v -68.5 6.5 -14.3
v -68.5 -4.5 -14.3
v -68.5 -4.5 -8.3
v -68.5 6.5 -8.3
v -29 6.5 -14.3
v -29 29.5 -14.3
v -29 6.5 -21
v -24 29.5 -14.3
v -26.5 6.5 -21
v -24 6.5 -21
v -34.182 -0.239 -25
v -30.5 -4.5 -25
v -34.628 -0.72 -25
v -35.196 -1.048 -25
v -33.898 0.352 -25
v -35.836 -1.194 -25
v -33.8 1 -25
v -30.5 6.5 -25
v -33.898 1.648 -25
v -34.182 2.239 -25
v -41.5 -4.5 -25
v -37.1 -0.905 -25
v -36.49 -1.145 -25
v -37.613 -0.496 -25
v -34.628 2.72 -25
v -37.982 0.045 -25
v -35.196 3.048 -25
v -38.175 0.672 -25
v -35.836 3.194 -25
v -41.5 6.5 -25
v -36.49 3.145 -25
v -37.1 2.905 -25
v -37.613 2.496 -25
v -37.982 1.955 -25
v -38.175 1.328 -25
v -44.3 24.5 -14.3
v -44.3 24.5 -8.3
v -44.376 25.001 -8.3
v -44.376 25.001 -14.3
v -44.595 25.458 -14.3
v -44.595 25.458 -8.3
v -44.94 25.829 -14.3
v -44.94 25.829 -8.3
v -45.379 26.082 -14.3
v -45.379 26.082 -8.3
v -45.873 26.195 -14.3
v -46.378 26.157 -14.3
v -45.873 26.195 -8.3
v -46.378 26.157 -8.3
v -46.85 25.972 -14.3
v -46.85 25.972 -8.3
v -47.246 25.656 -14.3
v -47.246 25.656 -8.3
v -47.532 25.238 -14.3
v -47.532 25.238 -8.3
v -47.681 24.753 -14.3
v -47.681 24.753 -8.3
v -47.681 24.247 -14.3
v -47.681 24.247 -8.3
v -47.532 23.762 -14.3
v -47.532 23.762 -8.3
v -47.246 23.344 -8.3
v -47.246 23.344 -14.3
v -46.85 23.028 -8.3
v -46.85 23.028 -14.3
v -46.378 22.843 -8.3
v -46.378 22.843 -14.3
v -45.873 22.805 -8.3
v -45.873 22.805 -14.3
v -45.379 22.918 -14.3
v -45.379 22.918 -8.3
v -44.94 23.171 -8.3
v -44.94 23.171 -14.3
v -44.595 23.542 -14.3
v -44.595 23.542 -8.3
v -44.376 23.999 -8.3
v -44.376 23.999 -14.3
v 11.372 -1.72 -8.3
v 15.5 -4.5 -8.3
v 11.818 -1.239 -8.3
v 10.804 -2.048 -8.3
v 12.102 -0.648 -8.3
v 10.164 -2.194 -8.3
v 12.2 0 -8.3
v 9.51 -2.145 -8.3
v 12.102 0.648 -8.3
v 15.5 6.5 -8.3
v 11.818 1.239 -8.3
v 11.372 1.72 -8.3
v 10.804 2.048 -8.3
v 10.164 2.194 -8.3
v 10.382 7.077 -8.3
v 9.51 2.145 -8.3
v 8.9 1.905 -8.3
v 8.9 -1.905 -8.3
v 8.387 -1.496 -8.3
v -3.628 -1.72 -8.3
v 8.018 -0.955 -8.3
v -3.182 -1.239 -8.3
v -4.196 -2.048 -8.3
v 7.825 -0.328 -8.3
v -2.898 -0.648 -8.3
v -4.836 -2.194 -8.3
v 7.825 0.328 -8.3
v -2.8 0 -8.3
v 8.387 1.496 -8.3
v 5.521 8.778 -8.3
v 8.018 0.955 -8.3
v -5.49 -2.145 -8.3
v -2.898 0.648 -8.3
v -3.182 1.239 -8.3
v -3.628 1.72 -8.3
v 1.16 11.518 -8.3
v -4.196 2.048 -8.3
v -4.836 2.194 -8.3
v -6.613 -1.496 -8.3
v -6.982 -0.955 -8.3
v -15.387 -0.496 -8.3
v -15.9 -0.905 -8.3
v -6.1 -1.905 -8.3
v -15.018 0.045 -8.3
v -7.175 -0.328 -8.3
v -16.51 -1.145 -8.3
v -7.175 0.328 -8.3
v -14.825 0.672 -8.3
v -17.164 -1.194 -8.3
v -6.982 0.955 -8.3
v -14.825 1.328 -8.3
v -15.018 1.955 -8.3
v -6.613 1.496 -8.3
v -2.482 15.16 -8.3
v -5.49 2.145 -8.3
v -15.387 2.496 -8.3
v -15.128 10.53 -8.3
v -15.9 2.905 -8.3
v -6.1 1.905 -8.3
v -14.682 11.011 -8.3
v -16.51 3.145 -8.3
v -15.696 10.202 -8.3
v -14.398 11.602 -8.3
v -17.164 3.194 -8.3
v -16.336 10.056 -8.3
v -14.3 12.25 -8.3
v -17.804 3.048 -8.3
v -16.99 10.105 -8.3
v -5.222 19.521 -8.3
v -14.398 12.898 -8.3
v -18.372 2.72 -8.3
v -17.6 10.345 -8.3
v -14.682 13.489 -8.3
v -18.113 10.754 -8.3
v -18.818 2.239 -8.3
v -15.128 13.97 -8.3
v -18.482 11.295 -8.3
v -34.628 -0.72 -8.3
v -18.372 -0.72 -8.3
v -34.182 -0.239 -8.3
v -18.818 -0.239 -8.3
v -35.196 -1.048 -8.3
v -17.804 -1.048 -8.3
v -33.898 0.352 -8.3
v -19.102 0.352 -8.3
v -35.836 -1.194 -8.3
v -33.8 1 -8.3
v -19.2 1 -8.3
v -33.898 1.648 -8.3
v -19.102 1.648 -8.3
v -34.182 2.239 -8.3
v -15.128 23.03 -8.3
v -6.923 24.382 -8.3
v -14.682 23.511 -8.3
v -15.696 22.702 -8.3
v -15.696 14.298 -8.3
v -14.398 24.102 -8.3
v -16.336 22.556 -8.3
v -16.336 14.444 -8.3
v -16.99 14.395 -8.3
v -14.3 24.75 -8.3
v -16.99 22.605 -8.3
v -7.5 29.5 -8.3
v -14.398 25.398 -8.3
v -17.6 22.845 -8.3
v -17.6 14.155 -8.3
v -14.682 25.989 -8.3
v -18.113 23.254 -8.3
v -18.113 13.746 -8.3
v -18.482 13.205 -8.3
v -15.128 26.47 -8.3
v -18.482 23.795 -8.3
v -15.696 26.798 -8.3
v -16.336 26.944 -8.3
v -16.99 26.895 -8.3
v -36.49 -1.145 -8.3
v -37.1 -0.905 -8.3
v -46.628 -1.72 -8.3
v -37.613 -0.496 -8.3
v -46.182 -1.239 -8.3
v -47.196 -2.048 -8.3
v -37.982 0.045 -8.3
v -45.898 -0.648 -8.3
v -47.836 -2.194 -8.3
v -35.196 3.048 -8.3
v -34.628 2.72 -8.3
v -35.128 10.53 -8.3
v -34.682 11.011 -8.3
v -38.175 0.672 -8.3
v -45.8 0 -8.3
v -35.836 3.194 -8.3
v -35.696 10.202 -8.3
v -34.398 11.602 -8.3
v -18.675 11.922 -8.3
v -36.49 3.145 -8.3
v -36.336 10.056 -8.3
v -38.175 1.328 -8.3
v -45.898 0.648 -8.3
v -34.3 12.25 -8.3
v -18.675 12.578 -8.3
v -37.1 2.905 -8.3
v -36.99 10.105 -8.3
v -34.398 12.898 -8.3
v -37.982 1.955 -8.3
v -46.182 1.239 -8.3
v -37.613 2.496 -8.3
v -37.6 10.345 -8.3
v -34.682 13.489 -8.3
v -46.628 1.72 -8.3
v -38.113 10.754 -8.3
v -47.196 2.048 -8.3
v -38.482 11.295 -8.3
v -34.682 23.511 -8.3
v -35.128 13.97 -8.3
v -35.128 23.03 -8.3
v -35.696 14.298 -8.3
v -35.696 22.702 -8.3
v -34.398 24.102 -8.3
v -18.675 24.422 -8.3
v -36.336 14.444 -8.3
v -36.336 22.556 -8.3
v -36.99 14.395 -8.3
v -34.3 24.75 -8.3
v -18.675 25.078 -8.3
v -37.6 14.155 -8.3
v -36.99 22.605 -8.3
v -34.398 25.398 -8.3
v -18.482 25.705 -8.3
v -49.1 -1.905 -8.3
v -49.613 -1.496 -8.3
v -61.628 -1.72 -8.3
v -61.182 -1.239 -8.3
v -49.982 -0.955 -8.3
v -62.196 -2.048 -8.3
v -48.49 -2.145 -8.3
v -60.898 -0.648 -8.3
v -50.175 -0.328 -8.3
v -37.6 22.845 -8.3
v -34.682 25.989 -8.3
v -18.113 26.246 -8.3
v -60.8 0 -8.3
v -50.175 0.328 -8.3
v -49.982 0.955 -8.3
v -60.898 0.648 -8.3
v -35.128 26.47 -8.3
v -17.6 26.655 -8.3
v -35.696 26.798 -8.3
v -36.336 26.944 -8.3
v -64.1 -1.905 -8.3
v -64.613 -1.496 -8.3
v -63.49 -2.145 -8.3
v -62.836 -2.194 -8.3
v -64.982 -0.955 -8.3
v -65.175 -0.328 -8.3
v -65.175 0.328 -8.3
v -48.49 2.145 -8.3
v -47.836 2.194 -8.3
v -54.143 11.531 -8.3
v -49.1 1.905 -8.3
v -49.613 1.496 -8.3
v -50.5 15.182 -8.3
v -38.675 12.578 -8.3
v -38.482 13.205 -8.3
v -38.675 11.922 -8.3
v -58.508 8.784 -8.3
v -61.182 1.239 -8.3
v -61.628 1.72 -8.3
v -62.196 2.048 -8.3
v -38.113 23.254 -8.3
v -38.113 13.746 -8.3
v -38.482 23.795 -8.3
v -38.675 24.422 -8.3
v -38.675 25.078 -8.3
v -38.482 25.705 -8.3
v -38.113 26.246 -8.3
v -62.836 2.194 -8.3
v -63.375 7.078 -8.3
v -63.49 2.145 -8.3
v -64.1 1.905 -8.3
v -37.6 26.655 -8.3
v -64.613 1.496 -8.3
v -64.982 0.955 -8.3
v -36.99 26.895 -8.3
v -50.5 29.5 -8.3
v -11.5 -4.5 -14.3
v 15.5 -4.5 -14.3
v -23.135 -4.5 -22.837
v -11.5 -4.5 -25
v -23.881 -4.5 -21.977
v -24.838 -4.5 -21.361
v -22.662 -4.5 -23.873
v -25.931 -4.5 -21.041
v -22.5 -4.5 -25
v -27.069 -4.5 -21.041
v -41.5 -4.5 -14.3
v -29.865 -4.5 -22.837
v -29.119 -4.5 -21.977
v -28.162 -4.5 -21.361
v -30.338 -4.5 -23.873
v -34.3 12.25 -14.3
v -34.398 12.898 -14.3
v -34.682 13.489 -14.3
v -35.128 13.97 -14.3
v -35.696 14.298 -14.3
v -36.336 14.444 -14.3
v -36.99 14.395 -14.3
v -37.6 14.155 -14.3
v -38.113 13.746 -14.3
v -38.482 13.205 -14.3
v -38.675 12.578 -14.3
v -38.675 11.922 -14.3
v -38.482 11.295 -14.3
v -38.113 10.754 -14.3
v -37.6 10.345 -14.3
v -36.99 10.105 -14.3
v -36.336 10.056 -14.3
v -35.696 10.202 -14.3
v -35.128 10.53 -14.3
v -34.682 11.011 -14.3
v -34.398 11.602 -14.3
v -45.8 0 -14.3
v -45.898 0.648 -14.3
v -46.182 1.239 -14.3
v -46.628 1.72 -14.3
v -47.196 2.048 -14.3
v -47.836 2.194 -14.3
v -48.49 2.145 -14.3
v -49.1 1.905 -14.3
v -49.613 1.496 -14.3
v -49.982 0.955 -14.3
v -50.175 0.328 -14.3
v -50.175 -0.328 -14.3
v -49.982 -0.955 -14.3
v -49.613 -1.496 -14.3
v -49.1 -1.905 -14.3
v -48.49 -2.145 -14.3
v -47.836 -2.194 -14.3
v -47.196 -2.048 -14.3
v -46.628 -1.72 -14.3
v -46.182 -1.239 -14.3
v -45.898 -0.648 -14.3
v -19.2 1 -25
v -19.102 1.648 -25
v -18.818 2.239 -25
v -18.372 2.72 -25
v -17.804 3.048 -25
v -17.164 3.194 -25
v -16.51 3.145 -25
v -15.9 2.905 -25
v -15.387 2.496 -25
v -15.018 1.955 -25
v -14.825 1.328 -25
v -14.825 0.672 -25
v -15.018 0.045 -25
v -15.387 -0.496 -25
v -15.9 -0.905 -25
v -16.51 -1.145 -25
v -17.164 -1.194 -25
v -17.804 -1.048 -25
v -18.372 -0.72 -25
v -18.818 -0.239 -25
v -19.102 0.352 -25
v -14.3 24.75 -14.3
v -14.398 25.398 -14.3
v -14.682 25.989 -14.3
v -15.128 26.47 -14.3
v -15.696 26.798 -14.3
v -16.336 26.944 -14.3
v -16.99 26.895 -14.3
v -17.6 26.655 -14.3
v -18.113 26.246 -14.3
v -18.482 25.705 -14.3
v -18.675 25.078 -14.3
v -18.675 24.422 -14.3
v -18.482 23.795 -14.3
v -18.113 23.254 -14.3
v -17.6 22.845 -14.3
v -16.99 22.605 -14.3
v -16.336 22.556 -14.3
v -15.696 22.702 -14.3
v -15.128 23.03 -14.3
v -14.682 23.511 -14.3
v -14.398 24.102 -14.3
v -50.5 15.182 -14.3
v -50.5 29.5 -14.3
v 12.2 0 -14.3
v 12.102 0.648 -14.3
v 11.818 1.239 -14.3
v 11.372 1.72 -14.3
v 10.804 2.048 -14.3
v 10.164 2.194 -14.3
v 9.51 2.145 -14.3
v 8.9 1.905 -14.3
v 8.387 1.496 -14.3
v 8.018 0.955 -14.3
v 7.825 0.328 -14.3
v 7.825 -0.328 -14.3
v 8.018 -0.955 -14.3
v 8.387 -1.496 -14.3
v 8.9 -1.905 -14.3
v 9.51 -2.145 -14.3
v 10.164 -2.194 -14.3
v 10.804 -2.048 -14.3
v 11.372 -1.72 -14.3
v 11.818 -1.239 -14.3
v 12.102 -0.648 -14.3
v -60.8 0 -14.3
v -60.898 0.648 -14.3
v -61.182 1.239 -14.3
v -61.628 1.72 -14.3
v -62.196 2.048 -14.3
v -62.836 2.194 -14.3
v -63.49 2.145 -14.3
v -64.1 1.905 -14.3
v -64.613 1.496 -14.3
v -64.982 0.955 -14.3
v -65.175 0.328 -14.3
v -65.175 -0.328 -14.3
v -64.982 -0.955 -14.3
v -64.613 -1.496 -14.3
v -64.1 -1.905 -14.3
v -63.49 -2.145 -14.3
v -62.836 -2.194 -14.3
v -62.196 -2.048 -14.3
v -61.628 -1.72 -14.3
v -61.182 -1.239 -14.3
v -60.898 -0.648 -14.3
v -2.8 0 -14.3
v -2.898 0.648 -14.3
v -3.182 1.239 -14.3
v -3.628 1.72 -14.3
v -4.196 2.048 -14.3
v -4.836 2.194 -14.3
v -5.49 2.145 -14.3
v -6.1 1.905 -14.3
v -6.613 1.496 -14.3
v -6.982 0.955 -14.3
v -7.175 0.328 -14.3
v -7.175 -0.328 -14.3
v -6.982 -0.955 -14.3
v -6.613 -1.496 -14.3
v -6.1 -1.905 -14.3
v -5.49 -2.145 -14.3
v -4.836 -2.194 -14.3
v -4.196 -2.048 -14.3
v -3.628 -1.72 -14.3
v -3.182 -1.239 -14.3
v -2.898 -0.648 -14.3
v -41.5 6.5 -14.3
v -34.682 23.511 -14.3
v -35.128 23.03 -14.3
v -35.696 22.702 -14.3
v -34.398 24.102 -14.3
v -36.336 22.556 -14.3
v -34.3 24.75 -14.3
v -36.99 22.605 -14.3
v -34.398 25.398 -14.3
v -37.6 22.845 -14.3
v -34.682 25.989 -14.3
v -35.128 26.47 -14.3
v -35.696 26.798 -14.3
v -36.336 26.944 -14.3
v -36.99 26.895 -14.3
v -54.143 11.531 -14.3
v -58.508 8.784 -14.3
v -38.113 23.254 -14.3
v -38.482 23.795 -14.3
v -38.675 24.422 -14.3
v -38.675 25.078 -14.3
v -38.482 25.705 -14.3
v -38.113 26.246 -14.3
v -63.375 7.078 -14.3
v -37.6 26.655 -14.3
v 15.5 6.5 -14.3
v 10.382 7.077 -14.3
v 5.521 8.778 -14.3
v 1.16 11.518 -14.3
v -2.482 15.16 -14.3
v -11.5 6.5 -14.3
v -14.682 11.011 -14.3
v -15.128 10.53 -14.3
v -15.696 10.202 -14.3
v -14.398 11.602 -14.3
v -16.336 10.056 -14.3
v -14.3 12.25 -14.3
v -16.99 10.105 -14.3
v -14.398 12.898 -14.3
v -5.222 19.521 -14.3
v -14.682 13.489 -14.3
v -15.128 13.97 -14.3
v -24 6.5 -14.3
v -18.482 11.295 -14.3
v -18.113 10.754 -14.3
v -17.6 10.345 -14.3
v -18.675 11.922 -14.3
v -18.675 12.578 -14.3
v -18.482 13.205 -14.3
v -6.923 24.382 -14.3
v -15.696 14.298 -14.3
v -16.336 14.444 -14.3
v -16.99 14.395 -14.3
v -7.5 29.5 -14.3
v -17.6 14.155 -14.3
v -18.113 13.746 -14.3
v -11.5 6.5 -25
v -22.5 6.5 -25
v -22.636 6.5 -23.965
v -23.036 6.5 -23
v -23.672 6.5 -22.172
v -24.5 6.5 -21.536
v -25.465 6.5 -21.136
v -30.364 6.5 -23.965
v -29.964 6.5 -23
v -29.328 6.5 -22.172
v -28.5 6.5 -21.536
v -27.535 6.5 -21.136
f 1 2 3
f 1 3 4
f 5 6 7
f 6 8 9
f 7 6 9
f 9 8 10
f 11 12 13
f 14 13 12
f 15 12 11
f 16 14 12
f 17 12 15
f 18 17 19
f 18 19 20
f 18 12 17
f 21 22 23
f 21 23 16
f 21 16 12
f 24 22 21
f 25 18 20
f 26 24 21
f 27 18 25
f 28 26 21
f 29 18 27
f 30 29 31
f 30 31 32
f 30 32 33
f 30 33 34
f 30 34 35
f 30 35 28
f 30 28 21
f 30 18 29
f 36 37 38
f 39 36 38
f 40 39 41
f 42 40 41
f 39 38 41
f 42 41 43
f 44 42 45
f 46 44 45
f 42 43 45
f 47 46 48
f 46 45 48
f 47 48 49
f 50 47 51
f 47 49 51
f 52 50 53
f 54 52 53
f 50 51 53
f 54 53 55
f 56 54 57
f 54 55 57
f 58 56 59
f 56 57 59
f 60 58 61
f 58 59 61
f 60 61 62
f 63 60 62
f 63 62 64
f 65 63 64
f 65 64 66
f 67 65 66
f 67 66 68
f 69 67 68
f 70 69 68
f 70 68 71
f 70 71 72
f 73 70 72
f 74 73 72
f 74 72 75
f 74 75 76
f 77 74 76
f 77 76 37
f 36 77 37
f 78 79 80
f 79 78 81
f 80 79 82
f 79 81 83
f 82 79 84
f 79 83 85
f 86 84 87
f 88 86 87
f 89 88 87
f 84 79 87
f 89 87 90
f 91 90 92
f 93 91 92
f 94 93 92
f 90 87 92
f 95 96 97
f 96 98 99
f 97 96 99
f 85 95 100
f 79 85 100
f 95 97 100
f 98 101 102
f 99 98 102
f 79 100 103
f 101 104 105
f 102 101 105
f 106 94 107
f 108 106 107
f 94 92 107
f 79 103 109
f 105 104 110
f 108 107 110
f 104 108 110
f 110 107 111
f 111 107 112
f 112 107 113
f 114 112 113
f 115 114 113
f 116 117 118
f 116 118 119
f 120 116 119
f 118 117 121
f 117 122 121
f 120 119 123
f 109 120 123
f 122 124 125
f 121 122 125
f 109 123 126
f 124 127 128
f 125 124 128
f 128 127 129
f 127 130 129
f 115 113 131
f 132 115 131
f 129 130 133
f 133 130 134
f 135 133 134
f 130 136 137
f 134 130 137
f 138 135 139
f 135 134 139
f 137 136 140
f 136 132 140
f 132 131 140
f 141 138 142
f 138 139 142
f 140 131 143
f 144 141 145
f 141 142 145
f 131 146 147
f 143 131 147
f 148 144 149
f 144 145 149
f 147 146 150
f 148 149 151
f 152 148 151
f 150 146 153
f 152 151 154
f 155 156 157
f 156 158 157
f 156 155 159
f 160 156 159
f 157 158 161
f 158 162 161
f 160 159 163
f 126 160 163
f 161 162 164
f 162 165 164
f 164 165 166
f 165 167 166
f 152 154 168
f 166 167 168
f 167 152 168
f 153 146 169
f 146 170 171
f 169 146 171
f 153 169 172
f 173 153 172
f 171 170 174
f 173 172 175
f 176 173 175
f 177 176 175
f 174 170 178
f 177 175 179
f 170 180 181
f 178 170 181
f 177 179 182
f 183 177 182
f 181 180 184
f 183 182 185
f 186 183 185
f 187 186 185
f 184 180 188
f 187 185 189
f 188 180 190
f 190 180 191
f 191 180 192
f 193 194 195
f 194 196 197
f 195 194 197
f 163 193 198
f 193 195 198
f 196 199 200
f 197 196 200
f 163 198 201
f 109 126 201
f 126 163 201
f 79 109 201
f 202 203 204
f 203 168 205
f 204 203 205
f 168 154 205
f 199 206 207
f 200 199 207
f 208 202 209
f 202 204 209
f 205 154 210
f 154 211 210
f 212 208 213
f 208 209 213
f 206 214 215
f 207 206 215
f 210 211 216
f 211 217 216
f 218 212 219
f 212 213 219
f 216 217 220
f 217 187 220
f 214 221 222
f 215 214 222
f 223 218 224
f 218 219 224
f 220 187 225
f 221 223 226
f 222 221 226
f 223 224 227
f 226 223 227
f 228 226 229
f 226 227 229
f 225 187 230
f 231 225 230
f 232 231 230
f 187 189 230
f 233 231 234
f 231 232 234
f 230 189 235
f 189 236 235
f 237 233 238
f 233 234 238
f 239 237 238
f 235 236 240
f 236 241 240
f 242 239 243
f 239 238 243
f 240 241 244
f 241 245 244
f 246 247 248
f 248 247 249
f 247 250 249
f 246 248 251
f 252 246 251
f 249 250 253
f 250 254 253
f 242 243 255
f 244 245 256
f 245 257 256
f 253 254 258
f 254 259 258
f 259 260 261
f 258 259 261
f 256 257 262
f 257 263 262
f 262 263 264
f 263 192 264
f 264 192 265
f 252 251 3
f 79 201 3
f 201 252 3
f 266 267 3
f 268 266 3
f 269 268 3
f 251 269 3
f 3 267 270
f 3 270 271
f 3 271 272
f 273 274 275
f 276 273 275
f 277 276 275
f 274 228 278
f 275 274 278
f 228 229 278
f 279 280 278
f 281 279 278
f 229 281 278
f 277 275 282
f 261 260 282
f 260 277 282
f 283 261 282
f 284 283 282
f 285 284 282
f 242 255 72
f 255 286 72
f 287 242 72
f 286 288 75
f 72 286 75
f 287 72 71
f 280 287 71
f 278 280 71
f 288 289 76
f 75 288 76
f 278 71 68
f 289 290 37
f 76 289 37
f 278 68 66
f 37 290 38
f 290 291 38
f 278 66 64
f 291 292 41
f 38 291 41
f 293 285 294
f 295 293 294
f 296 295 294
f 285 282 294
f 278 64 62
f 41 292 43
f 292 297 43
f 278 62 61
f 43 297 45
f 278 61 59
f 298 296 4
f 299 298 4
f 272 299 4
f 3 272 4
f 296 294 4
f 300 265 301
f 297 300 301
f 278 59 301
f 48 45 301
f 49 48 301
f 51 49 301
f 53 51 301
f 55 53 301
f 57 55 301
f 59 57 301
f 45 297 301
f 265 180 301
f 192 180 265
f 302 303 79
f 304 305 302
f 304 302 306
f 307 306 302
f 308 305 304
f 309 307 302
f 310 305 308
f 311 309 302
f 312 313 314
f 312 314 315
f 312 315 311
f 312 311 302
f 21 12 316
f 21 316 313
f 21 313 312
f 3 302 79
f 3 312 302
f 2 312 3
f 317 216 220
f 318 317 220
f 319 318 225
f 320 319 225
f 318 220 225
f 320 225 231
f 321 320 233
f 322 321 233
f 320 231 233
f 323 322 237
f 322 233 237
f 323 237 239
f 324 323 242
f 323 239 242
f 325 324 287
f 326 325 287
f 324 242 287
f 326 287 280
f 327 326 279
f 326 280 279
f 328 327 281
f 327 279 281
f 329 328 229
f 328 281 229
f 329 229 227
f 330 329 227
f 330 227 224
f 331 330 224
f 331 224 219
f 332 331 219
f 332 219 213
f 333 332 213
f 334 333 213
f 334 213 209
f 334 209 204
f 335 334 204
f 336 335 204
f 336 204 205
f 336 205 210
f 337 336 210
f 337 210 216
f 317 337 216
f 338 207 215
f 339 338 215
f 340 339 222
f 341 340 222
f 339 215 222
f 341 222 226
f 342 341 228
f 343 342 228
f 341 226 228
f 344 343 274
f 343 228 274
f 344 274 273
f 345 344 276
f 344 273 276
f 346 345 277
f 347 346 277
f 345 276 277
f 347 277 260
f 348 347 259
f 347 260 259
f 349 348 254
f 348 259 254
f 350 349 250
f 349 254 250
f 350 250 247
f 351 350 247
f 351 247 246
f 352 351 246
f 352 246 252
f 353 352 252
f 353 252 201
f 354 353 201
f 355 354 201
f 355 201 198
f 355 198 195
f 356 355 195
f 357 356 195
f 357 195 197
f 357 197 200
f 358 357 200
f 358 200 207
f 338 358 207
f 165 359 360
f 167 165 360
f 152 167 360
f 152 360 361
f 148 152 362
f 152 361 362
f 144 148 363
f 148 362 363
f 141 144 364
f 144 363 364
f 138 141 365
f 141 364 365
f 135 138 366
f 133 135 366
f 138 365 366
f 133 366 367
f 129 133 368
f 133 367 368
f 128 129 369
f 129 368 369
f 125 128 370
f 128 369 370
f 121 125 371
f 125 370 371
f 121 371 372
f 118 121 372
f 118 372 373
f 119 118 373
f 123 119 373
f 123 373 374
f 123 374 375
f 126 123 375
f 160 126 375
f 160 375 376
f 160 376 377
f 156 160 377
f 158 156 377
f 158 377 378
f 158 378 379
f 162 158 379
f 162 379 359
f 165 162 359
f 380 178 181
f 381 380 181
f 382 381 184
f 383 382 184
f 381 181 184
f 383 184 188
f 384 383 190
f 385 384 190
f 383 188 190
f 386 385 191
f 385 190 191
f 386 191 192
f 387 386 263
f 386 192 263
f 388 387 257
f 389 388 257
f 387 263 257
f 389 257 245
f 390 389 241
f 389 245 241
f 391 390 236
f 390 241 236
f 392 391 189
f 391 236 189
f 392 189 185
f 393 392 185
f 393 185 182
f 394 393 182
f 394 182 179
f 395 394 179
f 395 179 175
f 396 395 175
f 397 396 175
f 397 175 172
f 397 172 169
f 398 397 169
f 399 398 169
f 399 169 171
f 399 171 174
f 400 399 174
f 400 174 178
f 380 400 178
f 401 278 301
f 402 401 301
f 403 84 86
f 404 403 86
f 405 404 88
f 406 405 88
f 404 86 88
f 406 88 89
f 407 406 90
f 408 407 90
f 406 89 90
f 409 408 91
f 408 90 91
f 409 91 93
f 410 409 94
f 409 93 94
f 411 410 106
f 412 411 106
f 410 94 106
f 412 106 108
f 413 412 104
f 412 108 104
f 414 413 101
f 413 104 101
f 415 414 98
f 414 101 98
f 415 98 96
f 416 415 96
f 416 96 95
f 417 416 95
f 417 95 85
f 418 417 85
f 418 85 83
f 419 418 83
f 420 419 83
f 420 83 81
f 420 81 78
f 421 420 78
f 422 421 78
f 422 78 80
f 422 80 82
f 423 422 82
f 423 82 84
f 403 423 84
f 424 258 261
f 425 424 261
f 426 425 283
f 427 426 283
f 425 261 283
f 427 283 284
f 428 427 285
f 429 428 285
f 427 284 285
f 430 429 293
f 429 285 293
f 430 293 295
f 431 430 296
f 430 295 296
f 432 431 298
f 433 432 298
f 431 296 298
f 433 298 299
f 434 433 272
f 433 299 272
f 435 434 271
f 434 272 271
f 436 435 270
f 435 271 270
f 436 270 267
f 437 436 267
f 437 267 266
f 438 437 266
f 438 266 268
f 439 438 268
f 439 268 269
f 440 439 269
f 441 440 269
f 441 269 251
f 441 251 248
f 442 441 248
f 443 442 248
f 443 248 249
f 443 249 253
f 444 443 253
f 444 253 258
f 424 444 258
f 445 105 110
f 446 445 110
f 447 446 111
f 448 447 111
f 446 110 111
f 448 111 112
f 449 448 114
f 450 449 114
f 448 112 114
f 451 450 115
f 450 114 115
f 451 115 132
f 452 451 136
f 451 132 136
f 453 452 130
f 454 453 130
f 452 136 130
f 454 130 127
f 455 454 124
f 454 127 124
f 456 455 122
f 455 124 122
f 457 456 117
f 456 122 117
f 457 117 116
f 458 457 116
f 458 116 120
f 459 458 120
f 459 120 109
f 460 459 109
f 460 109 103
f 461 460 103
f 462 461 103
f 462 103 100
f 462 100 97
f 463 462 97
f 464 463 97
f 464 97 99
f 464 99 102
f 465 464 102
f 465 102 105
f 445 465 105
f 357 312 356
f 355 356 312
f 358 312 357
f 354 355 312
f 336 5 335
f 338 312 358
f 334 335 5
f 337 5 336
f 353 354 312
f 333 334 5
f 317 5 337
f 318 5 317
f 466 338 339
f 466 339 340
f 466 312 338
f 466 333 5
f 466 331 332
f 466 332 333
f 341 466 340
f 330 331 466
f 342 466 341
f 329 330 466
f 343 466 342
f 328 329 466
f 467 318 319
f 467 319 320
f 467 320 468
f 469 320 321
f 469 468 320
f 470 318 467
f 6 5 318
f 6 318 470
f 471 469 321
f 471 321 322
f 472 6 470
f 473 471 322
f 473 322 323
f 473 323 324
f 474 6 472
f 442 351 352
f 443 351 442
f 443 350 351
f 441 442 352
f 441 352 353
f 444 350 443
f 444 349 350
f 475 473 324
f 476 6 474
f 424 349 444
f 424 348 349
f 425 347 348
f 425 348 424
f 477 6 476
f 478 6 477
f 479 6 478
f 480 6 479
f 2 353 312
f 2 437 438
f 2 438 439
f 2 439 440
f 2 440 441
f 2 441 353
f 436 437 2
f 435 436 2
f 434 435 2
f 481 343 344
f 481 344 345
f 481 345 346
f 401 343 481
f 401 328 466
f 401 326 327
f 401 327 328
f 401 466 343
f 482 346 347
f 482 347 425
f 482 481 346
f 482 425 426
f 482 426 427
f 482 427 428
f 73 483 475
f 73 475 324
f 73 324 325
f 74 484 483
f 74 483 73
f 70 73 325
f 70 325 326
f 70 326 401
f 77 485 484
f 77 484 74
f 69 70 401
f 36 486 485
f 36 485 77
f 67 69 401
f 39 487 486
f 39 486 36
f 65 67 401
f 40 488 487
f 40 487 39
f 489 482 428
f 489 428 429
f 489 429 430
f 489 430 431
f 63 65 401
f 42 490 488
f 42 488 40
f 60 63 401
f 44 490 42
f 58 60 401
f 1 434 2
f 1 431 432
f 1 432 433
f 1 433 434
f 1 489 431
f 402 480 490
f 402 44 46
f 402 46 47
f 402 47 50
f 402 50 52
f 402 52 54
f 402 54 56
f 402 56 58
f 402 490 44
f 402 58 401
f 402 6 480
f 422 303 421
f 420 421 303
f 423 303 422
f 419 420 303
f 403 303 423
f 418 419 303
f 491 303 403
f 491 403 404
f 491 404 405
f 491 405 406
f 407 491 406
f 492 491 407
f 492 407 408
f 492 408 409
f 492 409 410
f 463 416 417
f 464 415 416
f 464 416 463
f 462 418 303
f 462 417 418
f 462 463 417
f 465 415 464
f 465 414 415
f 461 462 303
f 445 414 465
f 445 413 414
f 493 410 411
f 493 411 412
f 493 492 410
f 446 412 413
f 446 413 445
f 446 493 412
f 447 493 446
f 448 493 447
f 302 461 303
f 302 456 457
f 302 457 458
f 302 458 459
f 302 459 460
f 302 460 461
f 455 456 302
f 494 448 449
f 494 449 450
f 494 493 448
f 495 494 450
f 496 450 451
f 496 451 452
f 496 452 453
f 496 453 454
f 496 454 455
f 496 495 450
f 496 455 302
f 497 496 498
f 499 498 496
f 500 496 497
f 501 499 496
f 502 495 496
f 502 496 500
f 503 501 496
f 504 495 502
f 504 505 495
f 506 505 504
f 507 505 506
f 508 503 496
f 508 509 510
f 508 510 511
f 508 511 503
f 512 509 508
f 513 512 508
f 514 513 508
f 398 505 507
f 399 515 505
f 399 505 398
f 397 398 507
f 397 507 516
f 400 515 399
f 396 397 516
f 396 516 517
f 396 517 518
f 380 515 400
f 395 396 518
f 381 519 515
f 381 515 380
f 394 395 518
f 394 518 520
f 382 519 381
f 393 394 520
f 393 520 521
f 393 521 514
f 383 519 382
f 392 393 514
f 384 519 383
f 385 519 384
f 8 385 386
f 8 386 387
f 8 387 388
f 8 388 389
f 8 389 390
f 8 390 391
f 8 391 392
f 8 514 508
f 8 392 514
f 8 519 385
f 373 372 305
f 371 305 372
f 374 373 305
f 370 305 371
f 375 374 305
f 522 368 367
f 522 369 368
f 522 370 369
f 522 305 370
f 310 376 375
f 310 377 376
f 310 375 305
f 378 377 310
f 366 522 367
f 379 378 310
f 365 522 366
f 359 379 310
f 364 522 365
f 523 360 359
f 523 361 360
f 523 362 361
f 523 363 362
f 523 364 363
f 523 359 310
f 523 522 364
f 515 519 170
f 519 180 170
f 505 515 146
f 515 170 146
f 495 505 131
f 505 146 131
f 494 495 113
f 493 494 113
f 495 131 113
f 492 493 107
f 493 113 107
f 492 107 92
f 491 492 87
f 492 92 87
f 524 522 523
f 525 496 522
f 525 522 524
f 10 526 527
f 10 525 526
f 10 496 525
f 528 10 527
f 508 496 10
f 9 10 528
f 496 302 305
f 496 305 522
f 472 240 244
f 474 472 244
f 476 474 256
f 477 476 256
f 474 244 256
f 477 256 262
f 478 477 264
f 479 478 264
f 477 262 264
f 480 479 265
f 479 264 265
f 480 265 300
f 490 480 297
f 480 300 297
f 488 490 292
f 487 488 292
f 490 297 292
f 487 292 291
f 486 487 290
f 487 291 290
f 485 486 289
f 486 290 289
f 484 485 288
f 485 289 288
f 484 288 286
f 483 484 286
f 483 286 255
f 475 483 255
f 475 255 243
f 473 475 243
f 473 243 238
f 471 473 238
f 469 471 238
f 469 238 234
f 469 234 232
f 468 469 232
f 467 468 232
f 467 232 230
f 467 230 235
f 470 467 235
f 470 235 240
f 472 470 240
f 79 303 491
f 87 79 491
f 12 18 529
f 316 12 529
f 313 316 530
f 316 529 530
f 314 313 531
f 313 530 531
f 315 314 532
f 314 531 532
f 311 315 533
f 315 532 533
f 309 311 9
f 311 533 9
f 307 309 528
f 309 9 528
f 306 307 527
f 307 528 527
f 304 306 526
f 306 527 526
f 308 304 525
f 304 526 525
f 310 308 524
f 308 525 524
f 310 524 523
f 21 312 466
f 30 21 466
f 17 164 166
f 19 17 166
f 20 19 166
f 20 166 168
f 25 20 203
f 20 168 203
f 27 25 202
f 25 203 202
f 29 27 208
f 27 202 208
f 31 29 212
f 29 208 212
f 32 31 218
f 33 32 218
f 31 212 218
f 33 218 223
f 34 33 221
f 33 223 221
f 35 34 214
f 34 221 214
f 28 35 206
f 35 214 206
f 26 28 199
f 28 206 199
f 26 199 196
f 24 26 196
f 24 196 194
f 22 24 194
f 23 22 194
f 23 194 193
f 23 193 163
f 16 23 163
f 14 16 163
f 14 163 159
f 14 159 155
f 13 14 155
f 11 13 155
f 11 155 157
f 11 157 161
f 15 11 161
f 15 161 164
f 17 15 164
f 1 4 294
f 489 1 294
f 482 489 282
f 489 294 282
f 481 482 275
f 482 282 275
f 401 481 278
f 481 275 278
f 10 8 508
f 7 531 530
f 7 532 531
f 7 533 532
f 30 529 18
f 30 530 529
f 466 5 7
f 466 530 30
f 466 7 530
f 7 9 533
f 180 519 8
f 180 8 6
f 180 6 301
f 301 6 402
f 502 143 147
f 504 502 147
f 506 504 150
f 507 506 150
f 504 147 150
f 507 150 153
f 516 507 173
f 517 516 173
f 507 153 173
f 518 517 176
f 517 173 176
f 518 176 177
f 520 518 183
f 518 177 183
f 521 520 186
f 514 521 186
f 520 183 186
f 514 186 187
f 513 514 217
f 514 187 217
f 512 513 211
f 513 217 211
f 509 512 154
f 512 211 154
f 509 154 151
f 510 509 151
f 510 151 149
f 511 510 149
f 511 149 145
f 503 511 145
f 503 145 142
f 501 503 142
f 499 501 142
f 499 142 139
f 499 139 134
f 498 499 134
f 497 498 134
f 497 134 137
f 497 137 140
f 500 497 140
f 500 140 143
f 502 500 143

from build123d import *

# Parameters (mm, degrees)
SKETCH1_W           = 84
SKETCH1_H           = 34
BOSS_EXTRUDE1_DEPTH = 6
CUT_EXTRUDE1_DEPTH  = 75.823124768
SKETCH3_W           = 30
SKETCH3_H           = 11
BOSS_EXTRUDE2_DEPTH = 10.7
HOLE1_D             = 3.4
HOLE2_D             = 46
HOLE3_D             = 4.4
HOLE4_D             = 4.4
HOLE5_D             = 4.4
HOLE6_D             = 4.4
HOLE7_D             = 4.4
HOLE8_D             = 4.4
HOLE9_D             = 4.4
HOLE10_D            = 4.4
HOLE11_D            = 4.4
HOLE12_D            = 4.4
HOLE13_D            = 8
HOLE13_DEPTH        = 34
RIB1_REACH          = 59.09
SKETCH30_WALL_W     = 140.135684292
SKETCH30_WALL_H     = 5


with BuildPart() as part:
    # Sketch1 → Boss-Extrude1 (new body)
    with BuildSketch(Plane(origin=(0, 0, -14.3), x_dir=(-1, 0, 0), z_dir=(0, 0, -1))):
        with Locations((26.5, 12.5)):
            Rectangle(SKETCH1_W, SKETCH1_H)
    extrude(amount=-BOSS_EXTRUDE1_DEPTH)

    # Sketch2 → Cut-Extrude1 (cut, through all)
    with BuildSketch(Plane.XY.offset(-8.3)):
        with BuildLine():
            Line((-68.5, 29.5), (-68.5, 6.5))
            ThreePointArc((-68.5, 6.5), (-58.507750115, 8.78394482), (-50.5, 15.182178937))
            Line((-50.5, 15.182178937), (-50.5, 29.5))
            Line((-50.5, 29.5), (-68.5, 29.5))
        make_face()
    extrude(amount=-CUT_EXTRUDE1_DEPTH, mode=Mode.SUBTRACT)

    # Sketch3 → Boss-Extrude2 (add)
    with BuildSketch(Plane(origin=(0, 0, -14.3), x_dir=(-1, 0, 0), z_dir=(0, 0, -1))):
        with Locations((26.5, 1)):
            Rectangle(SKETCH3_W, SKETCH3_H)
    extrude(amount=BOSS_EXTRUDE2_DEPTH)

    # Hole1 (through all)
    with Locations(Plane(origin=(0, 0, -14.3), x_dir=(-1, 0, 0), z_dir=(0, 0, -1))):
        with Locations((46, 24.5)):
            Hole(HOLE1_D / 2)

    # Hole2 (through all)
    with Locations(Plane(origin=(0, 0, -14.3), x_dir=(-1, 0, 0), z_dir=(0, 0, -1))):
        with Locations((-15.5, 29.5)):
            Hole(HOLE2_D / 2)

    # Hole3 (through all)
    with Locations(Plane(origin=(0, 0, -14.3), x_dir=(-1, 0, 0), z_dir=(0, 0, -1))):
        with Locations((16.5, 12.25)):
            Hole(HOLE3_D / 2)

    # Hole4 (through all)
    with Locations(Plane(origin=(0, 0, -14.3), x_dir=(-1, 0, 0), z_dir=(0, 0, -1))):
        with Locations((36.5, 12.25)):
            Hole(HOLE4_D / 2)

    # Hole5 (through all)
    with Locations(Plane(origin=(0, 0, -14.3), x_dir=(-1, 0, 0), z_dir=(0, 0, -1))):
        with Locations((36.5, 24.75)):
            Hole(HOLE5_D / 2)

    # Hole6 (through all)
    with Locations(Plane(origin=(0, 0, -14.3), x_dir=(-1, 0, 0), z_dir=(0, 0, -1))):
        with Locations((16.5, 24.75)):
            Hole(HOLE6_D / 2)

    # Hole7 (through all)
    with Locations(Plane(origin=(0, 0, -25), x_dir=(-1, 0, 0), z_dir=(0, 0, -1))):
        with Locations((36, 1)):
            Hole(HOLE7_D / 2)

    # Hole8 (through all)
    with Locations(Plane(origin=(0, 0, -14.3), x_dir=(-1, 0, 0), z_dir=(0, 0, -1))):
        with Locations((48, 0)):
            Hole(HOLE8_D / 2)

    # Hole9 (through all)
    with Locations(Plane(origin=(0, 0, -14.3), x_dir=(-1, 0, 0), z_dir=(0, 0, -1))):
        with Locations((63, 0)):
            Hole(HOLE9_D / 2)

    # Hole10 (through all)
    with Locations(Plane.XY.offset(-8.3)):
        with Locations((-17, 1)):
            Hole(HOLE10_D / 2)

    # Hole11 (through all)
    with Locations(Plane(origin=(0, 0, -14.3), x_dir=(-1, 0, 0), z_dir=(0, 0, -1))):
        with Locations((5, 0)):
            Hole(HOLE11_D / 2)

    # Hole12 (through all)
    with Locations(Plane(origin=(0, 0, -14.3), x_dir=(-1, 0, 0), z_dir=(0, 0, -1))):
        with Locations((-10, 0)):
            Hole(HOLE12_D / 2)

    # Hole13
    with Locations(Plane.XZ.offset(4.5)):
        with Locations((-26.5, -25)):
            Hole(HOLE13_D / 2, depth=HOLE13_DEPTH)

    # Sketch30 wall → Rib1 (add, up to next)
    with BuildSketch(Plane(origin=(-26.5, 18, -17.65), x_dir=(0, -0.960093451224, -0.279679396661), z_dir=(0, -0.279679396661, 0.960093451224)), mode=Mode.PRIVATE) as rib1_sk1:
        Rectangle(SKETCH30_WALL_W, SKETCH30_WALL_H)
    rib1_tool1 = extrude(rib1_sk1.sketch, amount=RIB1_REACH, mode=Mode.PRIVATE) - part.part
    add(rib1_tool1.solids().sort_by_distance((-26.5, 18, -17.65))[0])


solid = part.part
